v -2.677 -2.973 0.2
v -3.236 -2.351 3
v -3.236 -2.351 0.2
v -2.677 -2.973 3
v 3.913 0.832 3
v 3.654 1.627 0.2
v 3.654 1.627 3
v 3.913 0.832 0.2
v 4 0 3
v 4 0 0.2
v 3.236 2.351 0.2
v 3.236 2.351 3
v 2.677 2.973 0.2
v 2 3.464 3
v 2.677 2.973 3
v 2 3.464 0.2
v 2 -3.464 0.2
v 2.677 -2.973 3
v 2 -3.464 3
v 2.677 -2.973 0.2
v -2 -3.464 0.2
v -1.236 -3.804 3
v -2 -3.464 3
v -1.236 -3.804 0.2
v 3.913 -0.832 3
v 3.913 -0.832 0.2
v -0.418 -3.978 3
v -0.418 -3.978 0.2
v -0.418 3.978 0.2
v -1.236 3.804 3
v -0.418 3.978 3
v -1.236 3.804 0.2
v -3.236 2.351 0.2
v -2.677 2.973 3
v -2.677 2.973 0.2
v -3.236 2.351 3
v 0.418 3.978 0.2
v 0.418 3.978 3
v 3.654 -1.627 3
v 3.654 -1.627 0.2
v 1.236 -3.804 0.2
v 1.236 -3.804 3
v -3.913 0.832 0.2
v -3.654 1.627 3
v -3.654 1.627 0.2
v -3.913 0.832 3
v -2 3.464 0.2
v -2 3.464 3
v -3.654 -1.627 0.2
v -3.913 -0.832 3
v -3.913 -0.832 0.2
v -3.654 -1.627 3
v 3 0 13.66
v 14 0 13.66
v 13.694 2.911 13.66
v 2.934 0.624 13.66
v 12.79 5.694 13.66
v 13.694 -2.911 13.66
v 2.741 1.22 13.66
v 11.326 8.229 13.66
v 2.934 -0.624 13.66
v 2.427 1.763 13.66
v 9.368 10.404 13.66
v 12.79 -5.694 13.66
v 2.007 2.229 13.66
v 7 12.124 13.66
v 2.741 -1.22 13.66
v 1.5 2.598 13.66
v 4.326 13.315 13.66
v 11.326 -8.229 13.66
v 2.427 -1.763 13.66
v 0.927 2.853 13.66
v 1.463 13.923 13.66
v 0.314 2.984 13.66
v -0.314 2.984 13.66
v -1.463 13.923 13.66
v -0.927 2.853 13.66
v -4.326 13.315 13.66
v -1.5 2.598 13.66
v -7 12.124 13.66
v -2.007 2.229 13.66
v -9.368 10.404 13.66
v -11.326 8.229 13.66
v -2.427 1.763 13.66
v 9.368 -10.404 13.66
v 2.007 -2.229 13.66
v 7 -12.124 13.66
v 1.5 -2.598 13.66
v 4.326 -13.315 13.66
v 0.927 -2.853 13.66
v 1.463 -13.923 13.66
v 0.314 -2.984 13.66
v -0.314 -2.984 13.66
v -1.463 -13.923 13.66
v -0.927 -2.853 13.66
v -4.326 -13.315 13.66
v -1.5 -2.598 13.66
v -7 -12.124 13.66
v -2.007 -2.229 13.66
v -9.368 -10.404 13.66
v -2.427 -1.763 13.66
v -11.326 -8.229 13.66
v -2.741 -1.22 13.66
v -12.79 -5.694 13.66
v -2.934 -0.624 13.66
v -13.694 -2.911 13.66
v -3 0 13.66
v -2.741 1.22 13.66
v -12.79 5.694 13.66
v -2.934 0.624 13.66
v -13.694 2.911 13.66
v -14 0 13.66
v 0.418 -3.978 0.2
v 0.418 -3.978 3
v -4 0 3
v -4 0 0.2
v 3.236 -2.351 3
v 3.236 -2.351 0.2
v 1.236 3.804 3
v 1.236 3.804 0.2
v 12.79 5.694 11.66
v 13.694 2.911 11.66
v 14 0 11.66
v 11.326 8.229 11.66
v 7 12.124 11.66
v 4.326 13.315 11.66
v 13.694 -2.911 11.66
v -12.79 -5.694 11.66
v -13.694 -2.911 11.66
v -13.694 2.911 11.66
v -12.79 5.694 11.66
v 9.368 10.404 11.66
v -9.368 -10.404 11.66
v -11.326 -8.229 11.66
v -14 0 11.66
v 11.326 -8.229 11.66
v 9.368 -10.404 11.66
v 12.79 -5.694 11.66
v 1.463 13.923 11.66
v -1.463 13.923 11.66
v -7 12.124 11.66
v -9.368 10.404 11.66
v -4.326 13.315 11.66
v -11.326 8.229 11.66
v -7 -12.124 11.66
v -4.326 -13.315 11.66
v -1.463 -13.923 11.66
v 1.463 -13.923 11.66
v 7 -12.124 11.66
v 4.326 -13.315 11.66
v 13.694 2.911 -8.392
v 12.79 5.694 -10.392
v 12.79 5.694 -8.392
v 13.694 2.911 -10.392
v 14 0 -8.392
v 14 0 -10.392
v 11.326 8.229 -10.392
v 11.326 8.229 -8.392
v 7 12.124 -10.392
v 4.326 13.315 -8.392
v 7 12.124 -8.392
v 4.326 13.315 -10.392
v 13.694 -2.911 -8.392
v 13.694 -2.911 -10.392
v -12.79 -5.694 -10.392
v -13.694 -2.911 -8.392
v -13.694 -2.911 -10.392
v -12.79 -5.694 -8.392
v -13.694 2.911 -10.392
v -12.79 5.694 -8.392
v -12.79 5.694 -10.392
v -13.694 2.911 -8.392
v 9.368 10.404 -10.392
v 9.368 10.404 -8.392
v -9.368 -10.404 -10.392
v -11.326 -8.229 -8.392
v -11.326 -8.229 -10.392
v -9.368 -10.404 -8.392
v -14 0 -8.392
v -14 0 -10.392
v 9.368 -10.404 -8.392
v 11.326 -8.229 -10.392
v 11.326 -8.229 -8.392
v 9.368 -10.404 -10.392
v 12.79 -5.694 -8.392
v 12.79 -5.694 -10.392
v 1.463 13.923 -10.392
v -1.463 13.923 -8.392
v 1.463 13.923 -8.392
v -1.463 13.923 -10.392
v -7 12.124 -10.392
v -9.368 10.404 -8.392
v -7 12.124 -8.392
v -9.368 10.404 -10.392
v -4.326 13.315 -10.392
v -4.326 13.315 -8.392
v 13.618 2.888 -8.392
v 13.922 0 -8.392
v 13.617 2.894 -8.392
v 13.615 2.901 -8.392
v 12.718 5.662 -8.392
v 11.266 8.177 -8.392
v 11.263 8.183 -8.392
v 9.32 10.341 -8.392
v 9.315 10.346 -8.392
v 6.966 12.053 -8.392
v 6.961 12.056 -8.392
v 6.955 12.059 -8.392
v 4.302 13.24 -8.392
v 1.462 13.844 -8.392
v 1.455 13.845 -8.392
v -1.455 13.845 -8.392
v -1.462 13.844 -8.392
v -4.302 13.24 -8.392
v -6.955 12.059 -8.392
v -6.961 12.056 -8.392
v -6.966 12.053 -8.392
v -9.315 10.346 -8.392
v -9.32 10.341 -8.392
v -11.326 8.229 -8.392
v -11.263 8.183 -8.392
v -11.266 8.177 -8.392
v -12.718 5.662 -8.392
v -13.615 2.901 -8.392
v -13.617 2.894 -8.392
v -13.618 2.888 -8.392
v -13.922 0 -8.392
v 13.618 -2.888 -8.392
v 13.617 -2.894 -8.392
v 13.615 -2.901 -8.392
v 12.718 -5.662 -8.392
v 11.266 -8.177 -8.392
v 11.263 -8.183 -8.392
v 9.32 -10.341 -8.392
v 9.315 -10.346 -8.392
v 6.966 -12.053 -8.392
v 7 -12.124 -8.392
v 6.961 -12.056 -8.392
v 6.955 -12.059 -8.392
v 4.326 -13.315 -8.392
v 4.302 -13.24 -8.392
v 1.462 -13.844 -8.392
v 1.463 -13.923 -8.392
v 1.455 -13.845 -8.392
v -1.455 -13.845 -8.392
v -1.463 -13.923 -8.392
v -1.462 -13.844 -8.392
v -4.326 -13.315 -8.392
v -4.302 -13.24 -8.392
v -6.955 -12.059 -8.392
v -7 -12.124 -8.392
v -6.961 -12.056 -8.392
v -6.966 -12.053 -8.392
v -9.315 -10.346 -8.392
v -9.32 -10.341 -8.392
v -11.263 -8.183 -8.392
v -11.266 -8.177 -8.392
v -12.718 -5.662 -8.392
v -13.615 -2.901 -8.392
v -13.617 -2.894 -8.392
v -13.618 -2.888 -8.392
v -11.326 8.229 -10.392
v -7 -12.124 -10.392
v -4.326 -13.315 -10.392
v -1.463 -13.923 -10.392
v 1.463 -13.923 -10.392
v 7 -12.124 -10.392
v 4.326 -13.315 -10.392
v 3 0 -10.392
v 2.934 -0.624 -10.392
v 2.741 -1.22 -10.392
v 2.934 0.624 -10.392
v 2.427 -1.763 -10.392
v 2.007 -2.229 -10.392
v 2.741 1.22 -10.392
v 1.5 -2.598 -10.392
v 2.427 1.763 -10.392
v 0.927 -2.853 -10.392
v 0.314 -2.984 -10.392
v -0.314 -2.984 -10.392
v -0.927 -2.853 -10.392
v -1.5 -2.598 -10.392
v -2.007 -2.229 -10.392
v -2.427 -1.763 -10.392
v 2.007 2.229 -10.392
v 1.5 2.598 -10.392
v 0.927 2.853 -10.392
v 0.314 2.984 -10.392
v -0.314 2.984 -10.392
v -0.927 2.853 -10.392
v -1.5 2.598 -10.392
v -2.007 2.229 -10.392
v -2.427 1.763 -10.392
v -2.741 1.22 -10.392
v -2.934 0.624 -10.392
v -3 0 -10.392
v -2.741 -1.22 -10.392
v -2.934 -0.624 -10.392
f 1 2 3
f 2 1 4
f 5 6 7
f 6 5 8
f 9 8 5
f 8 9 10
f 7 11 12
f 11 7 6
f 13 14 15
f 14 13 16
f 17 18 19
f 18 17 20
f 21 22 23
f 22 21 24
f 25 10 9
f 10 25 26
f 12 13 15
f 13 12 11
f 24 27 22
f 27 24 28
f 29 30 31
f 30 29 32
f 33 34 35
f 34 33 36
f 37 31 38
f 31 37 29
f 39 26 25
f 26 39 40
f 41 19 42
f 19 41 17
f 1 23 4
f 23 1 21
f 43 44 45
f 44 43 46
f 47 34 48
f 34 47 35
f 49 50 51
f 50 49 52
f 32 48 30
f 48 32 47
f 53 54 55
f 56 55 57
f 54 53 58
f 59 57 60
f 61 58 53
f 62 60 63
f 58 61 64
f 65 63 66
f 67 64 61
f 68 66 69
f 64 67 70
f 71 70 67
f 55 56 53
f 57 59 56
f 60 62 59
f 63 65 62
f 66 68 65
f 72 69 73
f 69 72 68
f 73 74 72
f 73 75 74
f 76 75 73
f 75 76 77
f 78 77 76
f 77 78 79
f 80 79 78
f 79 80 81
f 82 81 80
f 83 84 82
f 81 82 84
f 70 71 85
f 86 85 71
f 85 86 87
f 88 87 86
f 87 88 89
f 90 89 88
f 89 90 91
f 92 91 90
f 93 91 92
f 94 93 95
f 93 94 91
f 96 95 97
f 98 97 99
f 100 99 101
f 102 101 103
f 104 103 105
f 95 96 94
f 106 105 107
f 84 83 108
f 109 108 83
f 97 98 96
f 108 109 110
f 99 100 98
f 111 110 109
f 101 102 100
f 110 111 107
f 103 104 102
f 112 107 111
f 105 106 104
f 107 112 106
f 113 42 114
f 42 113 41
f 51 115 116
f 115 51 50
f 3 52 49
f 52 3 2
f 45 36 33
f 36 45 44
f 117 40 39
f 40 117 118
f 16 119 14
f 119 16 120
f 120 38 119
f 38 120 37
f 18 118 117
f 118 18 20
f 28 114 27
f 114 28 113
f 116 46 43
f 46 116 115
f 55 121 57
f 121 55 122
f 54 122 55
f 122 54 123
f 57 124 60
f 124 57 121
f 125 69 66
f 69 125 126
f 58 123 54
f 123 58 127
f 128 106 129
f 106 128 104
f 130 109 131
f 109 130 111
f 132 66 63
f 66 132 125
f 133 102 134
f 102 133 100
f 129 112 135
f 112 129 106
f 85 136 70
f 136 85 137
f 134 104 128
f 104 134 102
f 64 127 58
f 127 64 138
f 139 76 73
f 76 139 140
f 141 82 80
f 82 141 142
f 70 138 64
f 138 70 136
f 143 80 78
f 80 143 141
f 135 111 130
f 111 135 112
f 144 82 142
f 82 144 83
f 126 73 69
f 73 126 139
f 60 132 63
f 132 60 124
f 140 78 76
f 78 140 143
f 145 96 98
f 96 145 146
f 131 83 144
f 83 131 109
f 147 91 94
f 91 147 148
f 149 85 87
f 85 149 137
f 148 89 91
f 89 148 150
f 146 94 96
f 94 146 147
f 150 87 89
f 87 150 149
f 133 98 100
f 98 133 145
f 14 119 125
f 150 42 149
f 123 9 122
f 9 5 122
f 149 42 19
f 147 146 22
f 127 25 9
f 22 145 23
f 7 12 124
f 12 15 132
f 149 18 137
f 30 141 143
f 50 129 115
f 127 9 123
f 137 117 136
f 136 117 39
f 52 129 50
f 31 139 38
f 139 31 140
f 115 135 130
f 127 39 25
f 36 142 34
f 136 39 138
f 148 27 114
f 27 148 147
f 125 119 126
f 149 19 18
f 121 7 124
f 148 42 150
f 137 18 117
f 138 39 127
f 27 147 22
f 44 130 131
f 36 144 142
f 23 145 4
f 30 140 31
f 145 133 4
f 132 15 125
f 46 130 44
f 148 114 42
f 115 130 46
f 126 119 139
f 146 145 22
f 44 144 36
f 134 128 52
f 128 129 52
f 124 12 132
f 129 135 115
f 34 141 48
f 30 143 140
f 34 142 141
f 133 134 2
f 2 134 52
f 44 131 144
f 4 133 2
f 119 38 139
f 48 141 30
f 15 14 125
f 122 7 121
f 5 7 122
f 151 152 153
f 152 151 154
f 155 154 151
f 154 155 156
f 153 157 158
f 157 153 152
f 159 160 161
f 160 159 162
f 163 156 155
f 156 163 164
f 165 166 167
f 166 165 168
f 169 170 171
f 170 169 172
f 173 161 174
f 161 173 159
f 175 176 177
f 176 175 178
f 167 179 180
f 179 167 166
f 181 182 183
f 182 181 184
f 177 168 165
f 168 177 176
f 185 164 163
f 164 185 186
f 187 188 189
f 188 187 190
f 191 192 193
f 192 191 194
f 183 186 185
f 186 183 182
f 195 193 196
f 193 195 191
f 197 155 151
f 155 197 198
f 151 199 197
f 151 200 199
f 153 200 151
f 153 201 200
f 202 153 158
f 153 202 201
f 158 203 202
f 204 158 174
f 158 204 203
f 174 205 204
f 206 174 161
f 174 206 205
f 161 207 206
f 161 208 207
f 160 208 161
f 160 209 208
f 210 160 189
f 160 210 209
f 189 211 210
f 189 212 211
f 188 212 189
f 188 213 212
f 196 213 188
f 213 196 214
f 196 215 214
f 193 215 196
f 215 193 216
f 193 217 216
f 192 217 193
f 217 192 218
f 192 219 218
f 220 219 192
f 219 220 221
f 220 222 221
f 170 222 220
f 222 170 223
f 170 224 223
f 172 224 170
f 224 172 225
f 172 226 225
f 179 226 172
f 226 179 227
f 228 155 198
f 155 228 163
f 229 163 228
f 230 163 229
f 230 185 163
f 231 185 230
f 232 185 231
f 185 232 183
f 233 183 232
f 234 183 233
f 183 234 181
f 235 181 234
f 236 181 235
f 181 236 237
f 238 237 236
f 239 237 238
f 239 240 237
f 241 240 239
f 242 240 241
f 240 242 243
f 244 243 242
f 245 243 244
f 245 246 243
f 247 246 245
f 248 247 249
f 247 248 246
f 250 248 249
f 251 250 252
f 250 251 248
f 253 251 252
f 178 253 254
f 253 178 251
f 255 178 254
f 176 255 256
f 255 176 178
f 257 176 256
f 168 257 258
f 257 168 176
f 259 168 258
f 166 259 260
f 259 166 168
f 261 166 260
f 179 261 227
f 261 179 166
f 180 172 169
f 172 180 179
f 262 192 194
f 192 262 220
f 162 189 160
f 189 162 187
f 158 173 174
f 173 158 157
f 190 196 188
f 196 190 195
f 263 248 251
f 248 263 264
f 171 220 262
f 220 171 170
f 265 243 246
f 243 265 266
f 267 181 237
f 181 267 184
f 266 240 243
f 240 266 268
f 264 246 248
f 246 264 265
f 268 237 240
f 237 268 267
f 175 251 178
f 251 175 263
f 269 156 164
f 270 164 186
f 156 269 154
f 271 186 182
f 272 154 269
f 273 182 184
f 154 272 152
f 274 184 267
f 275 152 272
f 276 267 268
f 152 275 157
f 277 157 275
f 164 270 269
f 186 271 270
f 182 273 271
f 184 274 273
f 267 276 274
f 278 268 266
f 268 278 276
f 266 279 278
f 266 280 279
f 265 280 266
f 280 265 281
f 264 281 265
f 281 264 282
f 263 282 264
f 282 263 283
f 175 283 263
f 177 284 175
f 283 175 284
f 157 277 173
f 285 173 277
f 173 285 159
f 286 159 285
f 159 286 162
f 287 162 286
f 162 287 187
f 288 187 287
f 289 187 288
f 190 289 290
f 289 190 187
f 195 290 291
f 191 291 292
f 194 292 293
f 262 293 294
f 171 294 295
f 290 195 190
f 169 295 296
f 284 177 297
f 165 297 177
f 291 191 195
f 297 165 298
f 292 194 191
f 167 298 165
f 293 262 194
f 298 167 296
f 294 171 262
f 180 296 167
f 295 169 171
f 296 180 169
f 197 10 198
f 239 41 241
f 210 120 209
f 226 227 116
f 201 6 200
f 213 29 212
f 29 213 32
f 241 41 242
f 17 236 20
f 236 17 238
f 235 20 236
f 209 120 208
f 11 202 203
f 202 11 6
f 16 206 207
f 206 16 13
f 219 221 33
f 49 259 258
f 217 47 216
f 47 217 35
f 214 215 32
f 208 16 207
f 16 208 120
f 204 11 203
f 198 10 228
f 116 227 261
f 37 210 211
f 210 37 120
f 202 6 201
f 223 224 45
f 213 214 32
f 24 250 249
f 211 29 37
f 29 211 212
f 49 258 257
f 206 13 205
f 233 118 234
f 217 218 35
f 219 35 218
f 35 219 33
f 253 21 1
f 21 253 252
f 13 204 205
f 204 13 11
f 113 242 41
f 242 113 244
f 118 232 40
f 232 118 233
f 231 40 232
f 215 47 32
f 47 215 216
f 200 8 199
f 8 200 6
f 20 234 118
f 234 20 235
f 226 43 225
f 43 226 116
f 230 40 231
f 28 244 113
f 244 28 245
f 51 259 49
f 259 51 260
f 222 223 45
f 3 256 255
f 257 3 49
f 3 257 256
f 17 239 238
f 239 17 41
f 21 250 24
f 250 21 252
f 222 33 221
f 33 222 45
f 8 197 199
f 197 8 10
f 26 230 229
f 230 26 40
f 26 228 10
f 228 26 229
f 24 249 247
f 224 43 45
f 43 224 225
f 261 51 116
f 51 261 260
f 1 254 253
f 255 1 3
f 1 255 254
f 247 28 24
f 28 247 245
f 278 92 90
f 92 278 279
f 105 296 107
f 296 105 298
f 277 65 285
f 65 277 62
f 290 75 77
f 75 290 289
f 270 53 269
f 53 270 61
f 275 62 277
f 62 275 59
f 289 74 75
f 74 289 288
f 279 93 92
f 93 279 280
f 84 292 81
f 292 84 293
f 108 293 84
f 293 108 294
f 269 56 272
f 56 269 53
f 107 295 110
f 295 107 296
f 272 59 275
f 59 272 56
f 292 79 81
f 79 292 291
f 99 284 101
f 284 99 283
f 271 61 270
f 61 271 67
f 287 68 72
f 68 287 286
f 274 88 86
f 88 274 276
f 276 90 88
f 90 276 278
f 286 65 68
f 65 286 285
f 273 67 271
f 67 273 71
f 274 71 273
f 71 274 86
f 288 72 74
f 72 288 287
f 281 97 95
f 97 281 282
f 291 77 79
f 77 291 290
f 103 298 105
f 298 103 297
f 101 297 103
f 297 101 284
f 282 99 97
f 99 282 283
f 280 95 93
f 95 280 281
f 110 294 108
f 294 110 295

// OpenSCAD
//variables (mm)
bearingOD = 6;// bearing diameter
bearingwidth = 20;
beltwidth= 1;

slopfactor = .0; // it printed a bit tight on my printer so i added this slop factor to make the hole slightly looser.. you may not need it

thickness = 2;

	idlerID = bearingOD + slopfactor; 

	idlerOD = idlerID+thickness;
	$fn=30; //faceting

//these are the lips that hold the belt on
	lipheight = 10;
	lipthickness = 2;
	topangle = 30; //the angle the top lip overhang makes. You can increase this to lower the idler profile.

//construction
	difference(){
	union(){
            //cylinder(r=lipheight+idlerOD/2, h=lipthickness);
        cylinder(r=idlerOD/2, h = lipthickness*2+beltwidth+lipheight*cos(topangle));
        translate([0,0,lipthickness+beltwidth+lipheight*cos(topangle)])cylinder(r=lipheight+idlerOD/2, h=lipthickness);
		translate([0,0,beltwidth+lipthickness])cylinder(r1=idlerOD/2, r2=lipheight+idlerOD/2, h=lipheight*cos(topangle));
        
        translate([0,0,-((lipthickness+lipheight)*cos(topangle))])cylinder(r=lipheight+idlerOD/2, h=lipthickness);
		translate([0,0,-(lipheight*cos(topangle)-.2)])cylinder(r2=idlerOD/2, r1=lipheight+idlerOD/2, h=lipheight*cos(topangle));
    }
		translate([0,0,-(bearingwidth+(lipthickness*2)+beltwidth)/2])cylinder(r=idlerID/2, h=bearingwidth+(lipthickness*2)+beltwidth+2);
            // inner lip to hold bearing
		//translate([0,0,-1])cylinder(r=idlerID/2-1, h=bearingwidth);
}
